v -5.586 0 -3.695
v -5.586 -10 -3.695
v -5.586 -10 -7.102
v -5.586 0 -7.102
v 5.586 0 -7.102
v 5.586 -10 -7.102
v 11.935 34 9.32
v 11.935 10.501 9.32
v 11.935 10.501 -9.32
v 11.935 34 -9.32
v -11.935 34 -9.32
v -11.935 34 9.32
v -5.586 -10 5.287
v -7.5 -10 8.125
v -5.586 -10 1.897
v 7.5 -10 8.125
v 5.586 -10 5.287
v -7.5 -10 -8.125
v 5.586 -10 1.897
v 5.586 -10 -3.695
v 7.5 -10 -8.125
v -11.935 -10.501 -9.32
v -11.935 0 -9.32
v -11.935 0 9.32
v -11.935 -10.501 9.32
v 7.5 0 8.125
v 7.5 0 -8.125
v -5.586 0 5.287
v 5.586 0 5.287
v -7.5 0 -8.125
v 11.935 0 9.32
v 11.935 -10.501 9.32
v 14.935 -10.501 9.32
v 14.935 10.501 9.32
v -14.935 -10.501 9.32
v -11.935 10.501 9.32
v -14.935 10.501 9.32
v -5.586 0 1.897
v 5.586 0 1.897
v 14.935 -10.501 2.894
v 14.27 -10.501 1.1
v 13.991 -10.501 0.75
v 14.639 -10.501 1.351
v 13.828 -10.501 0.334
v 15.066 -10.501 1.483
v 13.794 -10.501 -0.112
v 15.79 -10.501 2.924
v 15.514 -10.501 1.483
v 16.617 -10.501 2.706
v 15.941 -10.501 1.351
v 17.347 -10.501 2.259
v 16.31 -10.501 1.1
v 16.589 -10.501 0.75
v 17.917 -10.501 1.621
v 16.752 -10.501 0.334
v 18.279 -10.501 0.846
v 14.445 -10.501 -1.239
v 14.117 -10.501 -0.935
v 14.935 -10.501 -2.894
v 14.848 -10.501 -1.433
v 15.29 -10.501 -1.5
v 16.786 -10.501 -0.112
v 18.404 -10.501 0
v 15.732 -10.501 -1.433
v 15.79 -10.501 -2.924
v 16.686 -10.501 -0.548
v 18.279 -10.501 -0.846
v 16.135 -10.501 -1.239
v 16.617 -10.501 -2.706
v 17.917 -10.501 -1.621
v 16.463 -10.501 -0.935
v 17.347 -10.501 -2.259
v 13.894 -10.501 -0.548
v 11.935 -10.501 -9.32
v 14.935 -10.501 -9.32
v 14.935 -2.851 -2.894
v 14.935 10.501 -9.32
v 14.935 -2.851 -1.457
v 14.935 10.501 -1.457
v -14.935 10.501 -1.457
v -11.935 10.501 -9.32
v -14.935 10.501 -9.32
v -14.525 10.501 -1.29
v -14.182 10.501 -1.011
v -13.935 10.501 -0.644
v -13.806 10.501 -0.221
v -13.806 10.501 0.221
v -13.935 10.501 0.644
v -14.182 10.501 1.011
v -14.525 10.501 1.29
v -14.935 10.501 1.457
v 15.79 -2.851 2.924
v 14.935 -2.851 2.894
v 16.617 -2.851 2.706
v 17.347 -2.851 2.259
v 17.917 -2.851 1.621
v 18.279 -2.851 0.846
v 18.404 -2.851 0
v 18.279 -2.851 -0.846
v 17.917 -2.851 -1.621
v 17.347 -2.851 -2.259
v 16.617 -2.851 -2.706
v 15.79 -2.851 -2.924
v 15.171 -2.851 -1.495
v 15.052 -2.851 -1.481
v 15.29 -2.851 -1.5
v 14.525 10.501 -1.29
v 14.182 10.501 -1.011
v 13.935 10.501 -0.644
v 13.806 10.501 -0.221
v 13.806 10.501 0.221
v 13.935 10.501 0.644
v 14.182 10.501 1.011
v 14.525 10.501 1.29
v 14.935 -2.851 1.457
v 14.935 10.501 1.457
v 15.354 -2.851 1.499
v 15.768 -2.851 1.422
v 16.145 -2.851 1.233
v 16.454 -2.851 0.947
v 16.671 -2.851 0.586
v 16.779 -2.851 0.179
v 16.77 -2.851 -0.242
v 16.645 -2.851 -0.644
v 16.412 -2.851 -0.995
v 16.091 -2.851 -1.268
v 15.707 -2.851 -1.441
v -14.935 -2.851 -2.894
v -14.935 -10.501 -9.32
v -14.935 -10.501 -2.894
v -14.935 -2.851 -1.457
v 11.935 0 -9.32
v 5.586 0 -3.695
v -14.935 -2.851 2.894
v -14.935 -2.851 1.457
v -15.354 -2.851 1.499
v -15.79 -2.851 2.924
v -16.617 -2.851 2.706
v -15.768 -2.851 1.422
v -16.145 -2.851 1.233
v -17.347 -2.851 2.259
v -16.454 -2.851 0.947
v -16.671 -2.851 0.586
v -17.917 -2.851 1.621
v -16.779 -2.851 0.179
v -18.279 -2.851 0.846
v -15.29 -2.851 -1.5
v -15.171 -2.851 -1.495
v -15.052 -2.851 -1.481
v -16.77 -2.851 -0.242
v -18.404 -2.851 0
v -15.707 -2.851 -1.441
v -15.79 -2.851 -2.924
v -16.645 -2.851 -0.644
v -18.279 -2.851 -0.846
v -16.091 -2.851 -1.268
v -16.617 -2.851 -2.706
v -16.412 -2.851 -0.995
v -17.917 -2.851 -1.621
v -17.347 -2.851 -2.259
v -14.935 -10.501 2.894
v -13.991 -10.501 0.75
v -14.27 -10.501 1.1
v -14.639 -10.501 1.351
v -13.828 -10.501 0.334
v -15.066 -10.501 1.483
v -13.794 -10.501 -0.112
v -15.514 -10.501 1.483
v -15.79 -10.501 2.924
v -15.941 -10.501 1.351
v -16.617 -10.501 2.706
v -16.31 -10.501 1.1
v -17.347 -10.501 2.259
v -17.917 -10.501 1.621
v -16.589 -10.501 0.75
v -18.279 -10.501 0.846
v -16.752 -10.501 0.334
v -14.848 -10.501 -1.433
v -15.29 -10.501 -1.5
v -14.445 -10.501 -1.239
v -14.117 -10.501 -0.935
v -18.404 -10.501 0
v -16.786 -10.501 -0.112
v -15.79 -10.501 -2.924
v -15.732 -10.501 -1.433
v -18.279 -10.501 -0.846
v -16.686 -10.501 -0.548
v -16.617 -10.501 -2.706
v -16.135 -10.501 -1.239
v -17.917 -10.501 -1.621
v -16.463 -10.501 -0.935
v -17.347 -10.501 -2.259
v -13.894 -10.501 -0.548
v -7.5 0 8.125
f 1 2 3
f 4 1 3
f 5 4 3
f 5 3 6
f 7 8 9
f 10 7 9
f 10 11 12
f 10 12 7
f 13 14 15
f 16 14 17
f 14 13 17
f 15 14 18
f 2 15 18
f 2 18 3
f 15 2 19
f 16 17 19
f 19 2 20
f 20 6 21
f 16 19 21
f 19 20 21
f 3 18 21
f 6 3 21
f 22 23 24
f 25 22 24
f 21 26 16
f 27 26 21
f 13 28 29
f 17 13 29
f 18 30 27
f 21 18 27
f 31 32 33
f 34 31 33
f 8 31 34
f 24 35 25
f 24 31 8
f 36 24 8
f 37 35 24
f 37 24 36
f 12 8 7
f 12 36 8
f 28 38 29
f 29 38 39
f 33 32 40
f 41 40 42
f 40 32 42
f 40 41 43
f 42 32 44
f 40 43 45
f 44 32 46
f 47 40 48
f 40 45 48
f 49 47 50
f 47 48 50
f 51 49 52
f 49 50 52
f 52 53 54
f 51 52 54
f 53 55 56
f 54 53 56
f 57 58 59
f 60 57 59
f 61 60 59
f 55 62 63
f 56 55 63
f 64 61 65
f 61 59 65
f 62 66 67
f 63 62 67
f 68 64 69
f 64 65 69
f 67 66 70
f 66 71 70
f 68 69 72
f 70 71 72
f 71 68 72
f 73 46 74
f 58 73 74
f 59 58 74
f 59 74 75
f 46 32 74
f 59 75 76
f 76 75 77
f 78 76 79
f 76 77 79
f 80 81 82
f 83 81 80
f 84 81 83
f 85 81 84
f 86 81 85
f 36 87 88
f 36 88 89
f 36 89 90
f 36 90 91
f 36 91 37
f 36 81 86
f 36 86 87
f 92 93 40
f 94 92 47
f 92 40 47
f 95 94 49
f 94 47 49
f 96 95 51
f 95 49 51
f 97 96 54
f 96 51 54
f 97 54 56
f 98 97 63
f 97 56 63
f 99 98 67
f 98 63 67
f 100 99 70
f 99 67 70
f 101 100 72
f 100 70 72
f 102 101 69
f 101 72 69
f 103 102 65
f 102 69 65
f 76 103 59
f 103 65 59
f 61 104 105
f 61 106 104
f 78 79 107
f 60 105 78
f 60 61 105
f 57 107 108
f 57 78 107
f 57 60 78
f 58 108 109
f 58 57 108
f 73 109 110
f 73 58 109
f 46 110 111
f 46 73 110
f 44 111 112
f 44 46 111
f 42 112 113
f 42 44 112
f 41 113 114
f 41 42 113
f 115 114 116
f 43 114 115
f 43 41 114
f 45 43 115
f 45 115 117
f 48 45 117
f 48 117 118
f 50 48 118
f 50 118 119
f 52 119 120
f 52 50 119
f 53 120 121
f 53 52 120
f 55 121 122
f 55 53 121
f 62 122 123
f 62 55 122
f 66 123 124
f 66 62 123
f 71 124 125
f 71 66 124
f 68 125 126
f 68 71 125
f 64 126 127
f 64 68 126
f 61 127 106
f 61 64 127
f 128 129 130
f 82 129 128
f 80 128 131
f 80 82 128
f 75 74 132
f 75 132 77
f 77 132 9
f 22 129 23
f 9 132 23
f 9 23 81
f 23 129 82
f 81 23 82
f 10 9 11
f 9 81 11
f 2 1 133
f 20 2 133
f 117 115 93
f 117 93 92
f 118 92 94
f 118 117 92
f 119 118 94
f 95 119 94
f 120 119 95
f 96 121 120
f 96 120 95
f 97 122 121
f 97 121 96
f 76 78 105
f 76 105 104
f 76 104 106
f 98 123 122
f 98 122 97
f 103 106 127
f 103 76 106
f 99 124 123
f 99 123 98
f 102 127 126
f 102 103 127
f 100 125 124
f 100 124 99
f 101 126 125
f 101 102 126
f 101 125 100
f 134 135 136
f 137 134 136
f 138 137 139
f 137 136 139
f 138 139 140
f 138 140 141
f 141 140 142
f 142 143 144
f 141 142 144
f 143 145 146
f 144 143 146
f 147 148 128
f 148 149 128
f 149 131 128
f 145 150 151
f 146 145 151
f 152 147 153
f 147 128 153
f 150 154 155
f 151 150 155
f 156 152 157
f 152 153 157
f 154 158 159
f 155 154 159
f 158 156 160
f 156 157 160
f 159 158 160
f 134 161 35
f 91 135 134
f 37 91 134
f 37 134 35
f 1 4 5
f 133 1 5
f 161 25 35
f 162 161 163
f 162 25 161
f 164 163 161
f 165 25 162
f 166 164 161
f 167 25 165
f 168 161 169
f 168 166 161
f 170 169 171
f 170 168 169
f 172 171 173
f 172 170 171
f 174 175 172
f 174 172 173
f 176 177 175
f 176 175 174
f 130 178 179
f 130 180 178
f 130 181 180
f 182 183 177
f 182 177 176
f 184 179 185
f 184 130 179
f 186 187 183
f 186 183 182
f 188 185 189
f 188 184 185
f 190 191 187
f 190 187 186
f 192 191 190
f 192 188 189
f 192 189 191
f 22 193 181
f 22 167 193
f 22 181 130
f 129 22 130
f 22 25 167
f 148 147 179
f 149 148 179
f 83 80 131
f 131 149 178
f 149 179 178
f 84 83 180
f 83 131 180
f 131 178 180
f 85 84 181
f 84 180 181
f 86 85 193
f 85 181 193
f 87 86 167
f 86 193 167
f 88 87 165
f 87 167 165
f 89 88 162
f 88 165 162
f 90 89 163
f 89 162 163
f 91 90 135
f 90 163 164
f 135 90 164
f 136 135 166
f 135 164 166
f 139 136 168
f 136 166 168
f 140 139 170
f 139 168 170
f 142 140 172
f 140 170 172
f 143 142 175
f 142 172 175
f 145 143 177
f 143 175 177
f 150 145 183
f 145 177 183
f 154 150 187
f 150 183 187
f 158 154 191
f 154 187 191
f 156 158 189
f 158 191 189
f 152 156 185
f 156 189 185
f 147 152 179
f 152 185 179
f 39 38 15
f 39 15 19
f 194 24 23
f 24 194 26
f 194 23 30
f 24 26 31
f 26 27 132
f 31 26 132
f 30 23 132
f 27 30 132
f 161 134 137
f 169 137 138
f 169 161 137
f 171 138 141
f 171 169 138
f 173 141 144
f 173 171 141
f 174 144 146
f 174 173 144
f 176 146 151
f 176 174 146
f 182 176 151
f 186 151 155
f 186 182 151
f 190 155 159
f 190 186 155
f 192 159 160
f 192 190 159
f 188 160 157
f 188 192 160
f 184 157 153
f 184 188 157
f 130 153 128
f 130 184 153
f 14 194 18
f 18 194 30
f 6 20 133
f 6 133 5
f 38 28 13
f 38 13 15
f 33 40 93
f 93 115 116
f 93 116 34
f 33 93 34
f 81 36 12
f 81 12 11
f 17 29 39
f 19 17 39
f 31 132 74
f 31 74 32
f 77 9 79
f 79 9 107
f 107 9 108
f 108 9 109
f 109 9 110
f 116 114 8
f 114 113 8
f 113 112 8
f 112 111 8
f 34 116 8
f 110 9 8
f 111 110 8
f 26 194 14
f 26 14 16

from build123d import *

# Parameters (mm, degrees)
SKETCH1_W           = 15
SKETCH1_H           = 16.25
BOSS_EXTRUDE1_DEPTH = 10
SKETCH2_W           = 11.171160898
SKETCH2_H           = 3.40778749
SKETCH2_H_2         = 3.38965483
CUT_EXTRUDE1_DEPTH  = 10
SKETCH3_W           = 23.87
SKETCH3_H           = 18.64
BOSS_EXTRUDE2_DEPTH = 34
SKETCH4_W           = 18.64
SKETCH4_H           = 21.002535876
BOSS_EXTRUDE3_DEPTH = 3
SKETCH5_R           = 2.94201074
BOSS_EXTRUDE4_DEPTH = 7.65
SKETCH6_R           = 1.5
CUT_EXTRUDE2_DEPTH  = 49.595866638


with BuildPart() as part:
    # Sketch1 → Boss-Extrude1 (new body)
    with BuildSketch(Plane(origin=(0, 0, 0), x_dir=(1, 0, 0), z_dir=(0, 1, 0))):
        Rectangle(SKETCH1_W, SKETCH1_H)
    extrude(amount=-BOSS_EXTRUDE1_DEPTH)

    # Sketch2 → Cut-Extrude1 (cut)
    with BuildSketch(Plane(origin=(0, 0, 0), x_dir=(1, 0, 0), z_dir=(0, 1, 0))):
        with Locations((0, 5.398551248)):
            Rectangle(SKETCH2_W, SKETCH2_H)
        with Locations((0, -3.591791831)):
            Rectangle(SKETCH2_W, SKETCH2_H_2)
    extrude(amount=-CUT_EXTRUDE1_DEPTH, mode=Mode.SUBTRACT)

    # Sketch3 → Boss-Extrude2 (add)
    with BuildSketch(Plane(origin=(0, 0, 0), x_dir=(1, 0, 0), z_dir=(0, 1, 0))):
        Rectangle(SKETCH3_W, SKETCH3_H)
    extrude(amount=BOSS_EXTRUDE2_DEPTH)

    # Sketch4 → Boss-Extrude3 (add)
    with BuildSketch(Plane.ZY.offset(11.935)):
        Rectangle(SKETCH4_W, SKETCH4_H)
    boss_extrude3 = extrude(amount=BOSS_EXTRUDE3_DEPTH)

    # Sketch5 → Boss-Extrude4 (add)
    with BuildSketch(Plane(origin=(0, -10.501267938, 0), x_dir=(-1, 0, 0), z_dir=(0, -1, 0))):
        with Locations((15.461680584, 0)):
            Circle(SKETCH5_R)
    boss_extrude4 = extrude(amount=-BOSS_EXTRUDE4_DEPTH)

    # Mirror1: Boss-Extrude3, Boss-Extrude4 across plane
    add(boss_extrude3.mirror(Plane(origin=(0, 0, 0), x_dir=(0, 0, 1), z_dir=(1, 0, 0))))
    add(boss_extrude4.mirror(Plane(origin=(0, 0, 0), x_dir=(0, 0, 1), z_dir=(1, 0, 0))))

    # Sketch6 → Cut-Extrude2 (cut, symmetric)
    with BuildSketch(Plane(origin=(0, -10, 0), x_dir=(-1, 0, 0), z_dir=(0, -1, 0))):
        with Locations(Location((15.29, 0, 0), (0, 0, 90))):
            Circle(SKETCH6_R)
    cut_extrude2 = extrude(amount=CUT_EXTRUDE2_DEPTH, both=True, mode=Mode.SUBTRACT)

    # Mirror2: Cut-Extrude2 across plane
    add(cut_extrude2.mirror(Plane(origin=(0, 0, 0), x_dir=(0, 0, 1), z_dir=(1, 0, 0))), mode=Mode.SUBTRACT)


solid = part.part
